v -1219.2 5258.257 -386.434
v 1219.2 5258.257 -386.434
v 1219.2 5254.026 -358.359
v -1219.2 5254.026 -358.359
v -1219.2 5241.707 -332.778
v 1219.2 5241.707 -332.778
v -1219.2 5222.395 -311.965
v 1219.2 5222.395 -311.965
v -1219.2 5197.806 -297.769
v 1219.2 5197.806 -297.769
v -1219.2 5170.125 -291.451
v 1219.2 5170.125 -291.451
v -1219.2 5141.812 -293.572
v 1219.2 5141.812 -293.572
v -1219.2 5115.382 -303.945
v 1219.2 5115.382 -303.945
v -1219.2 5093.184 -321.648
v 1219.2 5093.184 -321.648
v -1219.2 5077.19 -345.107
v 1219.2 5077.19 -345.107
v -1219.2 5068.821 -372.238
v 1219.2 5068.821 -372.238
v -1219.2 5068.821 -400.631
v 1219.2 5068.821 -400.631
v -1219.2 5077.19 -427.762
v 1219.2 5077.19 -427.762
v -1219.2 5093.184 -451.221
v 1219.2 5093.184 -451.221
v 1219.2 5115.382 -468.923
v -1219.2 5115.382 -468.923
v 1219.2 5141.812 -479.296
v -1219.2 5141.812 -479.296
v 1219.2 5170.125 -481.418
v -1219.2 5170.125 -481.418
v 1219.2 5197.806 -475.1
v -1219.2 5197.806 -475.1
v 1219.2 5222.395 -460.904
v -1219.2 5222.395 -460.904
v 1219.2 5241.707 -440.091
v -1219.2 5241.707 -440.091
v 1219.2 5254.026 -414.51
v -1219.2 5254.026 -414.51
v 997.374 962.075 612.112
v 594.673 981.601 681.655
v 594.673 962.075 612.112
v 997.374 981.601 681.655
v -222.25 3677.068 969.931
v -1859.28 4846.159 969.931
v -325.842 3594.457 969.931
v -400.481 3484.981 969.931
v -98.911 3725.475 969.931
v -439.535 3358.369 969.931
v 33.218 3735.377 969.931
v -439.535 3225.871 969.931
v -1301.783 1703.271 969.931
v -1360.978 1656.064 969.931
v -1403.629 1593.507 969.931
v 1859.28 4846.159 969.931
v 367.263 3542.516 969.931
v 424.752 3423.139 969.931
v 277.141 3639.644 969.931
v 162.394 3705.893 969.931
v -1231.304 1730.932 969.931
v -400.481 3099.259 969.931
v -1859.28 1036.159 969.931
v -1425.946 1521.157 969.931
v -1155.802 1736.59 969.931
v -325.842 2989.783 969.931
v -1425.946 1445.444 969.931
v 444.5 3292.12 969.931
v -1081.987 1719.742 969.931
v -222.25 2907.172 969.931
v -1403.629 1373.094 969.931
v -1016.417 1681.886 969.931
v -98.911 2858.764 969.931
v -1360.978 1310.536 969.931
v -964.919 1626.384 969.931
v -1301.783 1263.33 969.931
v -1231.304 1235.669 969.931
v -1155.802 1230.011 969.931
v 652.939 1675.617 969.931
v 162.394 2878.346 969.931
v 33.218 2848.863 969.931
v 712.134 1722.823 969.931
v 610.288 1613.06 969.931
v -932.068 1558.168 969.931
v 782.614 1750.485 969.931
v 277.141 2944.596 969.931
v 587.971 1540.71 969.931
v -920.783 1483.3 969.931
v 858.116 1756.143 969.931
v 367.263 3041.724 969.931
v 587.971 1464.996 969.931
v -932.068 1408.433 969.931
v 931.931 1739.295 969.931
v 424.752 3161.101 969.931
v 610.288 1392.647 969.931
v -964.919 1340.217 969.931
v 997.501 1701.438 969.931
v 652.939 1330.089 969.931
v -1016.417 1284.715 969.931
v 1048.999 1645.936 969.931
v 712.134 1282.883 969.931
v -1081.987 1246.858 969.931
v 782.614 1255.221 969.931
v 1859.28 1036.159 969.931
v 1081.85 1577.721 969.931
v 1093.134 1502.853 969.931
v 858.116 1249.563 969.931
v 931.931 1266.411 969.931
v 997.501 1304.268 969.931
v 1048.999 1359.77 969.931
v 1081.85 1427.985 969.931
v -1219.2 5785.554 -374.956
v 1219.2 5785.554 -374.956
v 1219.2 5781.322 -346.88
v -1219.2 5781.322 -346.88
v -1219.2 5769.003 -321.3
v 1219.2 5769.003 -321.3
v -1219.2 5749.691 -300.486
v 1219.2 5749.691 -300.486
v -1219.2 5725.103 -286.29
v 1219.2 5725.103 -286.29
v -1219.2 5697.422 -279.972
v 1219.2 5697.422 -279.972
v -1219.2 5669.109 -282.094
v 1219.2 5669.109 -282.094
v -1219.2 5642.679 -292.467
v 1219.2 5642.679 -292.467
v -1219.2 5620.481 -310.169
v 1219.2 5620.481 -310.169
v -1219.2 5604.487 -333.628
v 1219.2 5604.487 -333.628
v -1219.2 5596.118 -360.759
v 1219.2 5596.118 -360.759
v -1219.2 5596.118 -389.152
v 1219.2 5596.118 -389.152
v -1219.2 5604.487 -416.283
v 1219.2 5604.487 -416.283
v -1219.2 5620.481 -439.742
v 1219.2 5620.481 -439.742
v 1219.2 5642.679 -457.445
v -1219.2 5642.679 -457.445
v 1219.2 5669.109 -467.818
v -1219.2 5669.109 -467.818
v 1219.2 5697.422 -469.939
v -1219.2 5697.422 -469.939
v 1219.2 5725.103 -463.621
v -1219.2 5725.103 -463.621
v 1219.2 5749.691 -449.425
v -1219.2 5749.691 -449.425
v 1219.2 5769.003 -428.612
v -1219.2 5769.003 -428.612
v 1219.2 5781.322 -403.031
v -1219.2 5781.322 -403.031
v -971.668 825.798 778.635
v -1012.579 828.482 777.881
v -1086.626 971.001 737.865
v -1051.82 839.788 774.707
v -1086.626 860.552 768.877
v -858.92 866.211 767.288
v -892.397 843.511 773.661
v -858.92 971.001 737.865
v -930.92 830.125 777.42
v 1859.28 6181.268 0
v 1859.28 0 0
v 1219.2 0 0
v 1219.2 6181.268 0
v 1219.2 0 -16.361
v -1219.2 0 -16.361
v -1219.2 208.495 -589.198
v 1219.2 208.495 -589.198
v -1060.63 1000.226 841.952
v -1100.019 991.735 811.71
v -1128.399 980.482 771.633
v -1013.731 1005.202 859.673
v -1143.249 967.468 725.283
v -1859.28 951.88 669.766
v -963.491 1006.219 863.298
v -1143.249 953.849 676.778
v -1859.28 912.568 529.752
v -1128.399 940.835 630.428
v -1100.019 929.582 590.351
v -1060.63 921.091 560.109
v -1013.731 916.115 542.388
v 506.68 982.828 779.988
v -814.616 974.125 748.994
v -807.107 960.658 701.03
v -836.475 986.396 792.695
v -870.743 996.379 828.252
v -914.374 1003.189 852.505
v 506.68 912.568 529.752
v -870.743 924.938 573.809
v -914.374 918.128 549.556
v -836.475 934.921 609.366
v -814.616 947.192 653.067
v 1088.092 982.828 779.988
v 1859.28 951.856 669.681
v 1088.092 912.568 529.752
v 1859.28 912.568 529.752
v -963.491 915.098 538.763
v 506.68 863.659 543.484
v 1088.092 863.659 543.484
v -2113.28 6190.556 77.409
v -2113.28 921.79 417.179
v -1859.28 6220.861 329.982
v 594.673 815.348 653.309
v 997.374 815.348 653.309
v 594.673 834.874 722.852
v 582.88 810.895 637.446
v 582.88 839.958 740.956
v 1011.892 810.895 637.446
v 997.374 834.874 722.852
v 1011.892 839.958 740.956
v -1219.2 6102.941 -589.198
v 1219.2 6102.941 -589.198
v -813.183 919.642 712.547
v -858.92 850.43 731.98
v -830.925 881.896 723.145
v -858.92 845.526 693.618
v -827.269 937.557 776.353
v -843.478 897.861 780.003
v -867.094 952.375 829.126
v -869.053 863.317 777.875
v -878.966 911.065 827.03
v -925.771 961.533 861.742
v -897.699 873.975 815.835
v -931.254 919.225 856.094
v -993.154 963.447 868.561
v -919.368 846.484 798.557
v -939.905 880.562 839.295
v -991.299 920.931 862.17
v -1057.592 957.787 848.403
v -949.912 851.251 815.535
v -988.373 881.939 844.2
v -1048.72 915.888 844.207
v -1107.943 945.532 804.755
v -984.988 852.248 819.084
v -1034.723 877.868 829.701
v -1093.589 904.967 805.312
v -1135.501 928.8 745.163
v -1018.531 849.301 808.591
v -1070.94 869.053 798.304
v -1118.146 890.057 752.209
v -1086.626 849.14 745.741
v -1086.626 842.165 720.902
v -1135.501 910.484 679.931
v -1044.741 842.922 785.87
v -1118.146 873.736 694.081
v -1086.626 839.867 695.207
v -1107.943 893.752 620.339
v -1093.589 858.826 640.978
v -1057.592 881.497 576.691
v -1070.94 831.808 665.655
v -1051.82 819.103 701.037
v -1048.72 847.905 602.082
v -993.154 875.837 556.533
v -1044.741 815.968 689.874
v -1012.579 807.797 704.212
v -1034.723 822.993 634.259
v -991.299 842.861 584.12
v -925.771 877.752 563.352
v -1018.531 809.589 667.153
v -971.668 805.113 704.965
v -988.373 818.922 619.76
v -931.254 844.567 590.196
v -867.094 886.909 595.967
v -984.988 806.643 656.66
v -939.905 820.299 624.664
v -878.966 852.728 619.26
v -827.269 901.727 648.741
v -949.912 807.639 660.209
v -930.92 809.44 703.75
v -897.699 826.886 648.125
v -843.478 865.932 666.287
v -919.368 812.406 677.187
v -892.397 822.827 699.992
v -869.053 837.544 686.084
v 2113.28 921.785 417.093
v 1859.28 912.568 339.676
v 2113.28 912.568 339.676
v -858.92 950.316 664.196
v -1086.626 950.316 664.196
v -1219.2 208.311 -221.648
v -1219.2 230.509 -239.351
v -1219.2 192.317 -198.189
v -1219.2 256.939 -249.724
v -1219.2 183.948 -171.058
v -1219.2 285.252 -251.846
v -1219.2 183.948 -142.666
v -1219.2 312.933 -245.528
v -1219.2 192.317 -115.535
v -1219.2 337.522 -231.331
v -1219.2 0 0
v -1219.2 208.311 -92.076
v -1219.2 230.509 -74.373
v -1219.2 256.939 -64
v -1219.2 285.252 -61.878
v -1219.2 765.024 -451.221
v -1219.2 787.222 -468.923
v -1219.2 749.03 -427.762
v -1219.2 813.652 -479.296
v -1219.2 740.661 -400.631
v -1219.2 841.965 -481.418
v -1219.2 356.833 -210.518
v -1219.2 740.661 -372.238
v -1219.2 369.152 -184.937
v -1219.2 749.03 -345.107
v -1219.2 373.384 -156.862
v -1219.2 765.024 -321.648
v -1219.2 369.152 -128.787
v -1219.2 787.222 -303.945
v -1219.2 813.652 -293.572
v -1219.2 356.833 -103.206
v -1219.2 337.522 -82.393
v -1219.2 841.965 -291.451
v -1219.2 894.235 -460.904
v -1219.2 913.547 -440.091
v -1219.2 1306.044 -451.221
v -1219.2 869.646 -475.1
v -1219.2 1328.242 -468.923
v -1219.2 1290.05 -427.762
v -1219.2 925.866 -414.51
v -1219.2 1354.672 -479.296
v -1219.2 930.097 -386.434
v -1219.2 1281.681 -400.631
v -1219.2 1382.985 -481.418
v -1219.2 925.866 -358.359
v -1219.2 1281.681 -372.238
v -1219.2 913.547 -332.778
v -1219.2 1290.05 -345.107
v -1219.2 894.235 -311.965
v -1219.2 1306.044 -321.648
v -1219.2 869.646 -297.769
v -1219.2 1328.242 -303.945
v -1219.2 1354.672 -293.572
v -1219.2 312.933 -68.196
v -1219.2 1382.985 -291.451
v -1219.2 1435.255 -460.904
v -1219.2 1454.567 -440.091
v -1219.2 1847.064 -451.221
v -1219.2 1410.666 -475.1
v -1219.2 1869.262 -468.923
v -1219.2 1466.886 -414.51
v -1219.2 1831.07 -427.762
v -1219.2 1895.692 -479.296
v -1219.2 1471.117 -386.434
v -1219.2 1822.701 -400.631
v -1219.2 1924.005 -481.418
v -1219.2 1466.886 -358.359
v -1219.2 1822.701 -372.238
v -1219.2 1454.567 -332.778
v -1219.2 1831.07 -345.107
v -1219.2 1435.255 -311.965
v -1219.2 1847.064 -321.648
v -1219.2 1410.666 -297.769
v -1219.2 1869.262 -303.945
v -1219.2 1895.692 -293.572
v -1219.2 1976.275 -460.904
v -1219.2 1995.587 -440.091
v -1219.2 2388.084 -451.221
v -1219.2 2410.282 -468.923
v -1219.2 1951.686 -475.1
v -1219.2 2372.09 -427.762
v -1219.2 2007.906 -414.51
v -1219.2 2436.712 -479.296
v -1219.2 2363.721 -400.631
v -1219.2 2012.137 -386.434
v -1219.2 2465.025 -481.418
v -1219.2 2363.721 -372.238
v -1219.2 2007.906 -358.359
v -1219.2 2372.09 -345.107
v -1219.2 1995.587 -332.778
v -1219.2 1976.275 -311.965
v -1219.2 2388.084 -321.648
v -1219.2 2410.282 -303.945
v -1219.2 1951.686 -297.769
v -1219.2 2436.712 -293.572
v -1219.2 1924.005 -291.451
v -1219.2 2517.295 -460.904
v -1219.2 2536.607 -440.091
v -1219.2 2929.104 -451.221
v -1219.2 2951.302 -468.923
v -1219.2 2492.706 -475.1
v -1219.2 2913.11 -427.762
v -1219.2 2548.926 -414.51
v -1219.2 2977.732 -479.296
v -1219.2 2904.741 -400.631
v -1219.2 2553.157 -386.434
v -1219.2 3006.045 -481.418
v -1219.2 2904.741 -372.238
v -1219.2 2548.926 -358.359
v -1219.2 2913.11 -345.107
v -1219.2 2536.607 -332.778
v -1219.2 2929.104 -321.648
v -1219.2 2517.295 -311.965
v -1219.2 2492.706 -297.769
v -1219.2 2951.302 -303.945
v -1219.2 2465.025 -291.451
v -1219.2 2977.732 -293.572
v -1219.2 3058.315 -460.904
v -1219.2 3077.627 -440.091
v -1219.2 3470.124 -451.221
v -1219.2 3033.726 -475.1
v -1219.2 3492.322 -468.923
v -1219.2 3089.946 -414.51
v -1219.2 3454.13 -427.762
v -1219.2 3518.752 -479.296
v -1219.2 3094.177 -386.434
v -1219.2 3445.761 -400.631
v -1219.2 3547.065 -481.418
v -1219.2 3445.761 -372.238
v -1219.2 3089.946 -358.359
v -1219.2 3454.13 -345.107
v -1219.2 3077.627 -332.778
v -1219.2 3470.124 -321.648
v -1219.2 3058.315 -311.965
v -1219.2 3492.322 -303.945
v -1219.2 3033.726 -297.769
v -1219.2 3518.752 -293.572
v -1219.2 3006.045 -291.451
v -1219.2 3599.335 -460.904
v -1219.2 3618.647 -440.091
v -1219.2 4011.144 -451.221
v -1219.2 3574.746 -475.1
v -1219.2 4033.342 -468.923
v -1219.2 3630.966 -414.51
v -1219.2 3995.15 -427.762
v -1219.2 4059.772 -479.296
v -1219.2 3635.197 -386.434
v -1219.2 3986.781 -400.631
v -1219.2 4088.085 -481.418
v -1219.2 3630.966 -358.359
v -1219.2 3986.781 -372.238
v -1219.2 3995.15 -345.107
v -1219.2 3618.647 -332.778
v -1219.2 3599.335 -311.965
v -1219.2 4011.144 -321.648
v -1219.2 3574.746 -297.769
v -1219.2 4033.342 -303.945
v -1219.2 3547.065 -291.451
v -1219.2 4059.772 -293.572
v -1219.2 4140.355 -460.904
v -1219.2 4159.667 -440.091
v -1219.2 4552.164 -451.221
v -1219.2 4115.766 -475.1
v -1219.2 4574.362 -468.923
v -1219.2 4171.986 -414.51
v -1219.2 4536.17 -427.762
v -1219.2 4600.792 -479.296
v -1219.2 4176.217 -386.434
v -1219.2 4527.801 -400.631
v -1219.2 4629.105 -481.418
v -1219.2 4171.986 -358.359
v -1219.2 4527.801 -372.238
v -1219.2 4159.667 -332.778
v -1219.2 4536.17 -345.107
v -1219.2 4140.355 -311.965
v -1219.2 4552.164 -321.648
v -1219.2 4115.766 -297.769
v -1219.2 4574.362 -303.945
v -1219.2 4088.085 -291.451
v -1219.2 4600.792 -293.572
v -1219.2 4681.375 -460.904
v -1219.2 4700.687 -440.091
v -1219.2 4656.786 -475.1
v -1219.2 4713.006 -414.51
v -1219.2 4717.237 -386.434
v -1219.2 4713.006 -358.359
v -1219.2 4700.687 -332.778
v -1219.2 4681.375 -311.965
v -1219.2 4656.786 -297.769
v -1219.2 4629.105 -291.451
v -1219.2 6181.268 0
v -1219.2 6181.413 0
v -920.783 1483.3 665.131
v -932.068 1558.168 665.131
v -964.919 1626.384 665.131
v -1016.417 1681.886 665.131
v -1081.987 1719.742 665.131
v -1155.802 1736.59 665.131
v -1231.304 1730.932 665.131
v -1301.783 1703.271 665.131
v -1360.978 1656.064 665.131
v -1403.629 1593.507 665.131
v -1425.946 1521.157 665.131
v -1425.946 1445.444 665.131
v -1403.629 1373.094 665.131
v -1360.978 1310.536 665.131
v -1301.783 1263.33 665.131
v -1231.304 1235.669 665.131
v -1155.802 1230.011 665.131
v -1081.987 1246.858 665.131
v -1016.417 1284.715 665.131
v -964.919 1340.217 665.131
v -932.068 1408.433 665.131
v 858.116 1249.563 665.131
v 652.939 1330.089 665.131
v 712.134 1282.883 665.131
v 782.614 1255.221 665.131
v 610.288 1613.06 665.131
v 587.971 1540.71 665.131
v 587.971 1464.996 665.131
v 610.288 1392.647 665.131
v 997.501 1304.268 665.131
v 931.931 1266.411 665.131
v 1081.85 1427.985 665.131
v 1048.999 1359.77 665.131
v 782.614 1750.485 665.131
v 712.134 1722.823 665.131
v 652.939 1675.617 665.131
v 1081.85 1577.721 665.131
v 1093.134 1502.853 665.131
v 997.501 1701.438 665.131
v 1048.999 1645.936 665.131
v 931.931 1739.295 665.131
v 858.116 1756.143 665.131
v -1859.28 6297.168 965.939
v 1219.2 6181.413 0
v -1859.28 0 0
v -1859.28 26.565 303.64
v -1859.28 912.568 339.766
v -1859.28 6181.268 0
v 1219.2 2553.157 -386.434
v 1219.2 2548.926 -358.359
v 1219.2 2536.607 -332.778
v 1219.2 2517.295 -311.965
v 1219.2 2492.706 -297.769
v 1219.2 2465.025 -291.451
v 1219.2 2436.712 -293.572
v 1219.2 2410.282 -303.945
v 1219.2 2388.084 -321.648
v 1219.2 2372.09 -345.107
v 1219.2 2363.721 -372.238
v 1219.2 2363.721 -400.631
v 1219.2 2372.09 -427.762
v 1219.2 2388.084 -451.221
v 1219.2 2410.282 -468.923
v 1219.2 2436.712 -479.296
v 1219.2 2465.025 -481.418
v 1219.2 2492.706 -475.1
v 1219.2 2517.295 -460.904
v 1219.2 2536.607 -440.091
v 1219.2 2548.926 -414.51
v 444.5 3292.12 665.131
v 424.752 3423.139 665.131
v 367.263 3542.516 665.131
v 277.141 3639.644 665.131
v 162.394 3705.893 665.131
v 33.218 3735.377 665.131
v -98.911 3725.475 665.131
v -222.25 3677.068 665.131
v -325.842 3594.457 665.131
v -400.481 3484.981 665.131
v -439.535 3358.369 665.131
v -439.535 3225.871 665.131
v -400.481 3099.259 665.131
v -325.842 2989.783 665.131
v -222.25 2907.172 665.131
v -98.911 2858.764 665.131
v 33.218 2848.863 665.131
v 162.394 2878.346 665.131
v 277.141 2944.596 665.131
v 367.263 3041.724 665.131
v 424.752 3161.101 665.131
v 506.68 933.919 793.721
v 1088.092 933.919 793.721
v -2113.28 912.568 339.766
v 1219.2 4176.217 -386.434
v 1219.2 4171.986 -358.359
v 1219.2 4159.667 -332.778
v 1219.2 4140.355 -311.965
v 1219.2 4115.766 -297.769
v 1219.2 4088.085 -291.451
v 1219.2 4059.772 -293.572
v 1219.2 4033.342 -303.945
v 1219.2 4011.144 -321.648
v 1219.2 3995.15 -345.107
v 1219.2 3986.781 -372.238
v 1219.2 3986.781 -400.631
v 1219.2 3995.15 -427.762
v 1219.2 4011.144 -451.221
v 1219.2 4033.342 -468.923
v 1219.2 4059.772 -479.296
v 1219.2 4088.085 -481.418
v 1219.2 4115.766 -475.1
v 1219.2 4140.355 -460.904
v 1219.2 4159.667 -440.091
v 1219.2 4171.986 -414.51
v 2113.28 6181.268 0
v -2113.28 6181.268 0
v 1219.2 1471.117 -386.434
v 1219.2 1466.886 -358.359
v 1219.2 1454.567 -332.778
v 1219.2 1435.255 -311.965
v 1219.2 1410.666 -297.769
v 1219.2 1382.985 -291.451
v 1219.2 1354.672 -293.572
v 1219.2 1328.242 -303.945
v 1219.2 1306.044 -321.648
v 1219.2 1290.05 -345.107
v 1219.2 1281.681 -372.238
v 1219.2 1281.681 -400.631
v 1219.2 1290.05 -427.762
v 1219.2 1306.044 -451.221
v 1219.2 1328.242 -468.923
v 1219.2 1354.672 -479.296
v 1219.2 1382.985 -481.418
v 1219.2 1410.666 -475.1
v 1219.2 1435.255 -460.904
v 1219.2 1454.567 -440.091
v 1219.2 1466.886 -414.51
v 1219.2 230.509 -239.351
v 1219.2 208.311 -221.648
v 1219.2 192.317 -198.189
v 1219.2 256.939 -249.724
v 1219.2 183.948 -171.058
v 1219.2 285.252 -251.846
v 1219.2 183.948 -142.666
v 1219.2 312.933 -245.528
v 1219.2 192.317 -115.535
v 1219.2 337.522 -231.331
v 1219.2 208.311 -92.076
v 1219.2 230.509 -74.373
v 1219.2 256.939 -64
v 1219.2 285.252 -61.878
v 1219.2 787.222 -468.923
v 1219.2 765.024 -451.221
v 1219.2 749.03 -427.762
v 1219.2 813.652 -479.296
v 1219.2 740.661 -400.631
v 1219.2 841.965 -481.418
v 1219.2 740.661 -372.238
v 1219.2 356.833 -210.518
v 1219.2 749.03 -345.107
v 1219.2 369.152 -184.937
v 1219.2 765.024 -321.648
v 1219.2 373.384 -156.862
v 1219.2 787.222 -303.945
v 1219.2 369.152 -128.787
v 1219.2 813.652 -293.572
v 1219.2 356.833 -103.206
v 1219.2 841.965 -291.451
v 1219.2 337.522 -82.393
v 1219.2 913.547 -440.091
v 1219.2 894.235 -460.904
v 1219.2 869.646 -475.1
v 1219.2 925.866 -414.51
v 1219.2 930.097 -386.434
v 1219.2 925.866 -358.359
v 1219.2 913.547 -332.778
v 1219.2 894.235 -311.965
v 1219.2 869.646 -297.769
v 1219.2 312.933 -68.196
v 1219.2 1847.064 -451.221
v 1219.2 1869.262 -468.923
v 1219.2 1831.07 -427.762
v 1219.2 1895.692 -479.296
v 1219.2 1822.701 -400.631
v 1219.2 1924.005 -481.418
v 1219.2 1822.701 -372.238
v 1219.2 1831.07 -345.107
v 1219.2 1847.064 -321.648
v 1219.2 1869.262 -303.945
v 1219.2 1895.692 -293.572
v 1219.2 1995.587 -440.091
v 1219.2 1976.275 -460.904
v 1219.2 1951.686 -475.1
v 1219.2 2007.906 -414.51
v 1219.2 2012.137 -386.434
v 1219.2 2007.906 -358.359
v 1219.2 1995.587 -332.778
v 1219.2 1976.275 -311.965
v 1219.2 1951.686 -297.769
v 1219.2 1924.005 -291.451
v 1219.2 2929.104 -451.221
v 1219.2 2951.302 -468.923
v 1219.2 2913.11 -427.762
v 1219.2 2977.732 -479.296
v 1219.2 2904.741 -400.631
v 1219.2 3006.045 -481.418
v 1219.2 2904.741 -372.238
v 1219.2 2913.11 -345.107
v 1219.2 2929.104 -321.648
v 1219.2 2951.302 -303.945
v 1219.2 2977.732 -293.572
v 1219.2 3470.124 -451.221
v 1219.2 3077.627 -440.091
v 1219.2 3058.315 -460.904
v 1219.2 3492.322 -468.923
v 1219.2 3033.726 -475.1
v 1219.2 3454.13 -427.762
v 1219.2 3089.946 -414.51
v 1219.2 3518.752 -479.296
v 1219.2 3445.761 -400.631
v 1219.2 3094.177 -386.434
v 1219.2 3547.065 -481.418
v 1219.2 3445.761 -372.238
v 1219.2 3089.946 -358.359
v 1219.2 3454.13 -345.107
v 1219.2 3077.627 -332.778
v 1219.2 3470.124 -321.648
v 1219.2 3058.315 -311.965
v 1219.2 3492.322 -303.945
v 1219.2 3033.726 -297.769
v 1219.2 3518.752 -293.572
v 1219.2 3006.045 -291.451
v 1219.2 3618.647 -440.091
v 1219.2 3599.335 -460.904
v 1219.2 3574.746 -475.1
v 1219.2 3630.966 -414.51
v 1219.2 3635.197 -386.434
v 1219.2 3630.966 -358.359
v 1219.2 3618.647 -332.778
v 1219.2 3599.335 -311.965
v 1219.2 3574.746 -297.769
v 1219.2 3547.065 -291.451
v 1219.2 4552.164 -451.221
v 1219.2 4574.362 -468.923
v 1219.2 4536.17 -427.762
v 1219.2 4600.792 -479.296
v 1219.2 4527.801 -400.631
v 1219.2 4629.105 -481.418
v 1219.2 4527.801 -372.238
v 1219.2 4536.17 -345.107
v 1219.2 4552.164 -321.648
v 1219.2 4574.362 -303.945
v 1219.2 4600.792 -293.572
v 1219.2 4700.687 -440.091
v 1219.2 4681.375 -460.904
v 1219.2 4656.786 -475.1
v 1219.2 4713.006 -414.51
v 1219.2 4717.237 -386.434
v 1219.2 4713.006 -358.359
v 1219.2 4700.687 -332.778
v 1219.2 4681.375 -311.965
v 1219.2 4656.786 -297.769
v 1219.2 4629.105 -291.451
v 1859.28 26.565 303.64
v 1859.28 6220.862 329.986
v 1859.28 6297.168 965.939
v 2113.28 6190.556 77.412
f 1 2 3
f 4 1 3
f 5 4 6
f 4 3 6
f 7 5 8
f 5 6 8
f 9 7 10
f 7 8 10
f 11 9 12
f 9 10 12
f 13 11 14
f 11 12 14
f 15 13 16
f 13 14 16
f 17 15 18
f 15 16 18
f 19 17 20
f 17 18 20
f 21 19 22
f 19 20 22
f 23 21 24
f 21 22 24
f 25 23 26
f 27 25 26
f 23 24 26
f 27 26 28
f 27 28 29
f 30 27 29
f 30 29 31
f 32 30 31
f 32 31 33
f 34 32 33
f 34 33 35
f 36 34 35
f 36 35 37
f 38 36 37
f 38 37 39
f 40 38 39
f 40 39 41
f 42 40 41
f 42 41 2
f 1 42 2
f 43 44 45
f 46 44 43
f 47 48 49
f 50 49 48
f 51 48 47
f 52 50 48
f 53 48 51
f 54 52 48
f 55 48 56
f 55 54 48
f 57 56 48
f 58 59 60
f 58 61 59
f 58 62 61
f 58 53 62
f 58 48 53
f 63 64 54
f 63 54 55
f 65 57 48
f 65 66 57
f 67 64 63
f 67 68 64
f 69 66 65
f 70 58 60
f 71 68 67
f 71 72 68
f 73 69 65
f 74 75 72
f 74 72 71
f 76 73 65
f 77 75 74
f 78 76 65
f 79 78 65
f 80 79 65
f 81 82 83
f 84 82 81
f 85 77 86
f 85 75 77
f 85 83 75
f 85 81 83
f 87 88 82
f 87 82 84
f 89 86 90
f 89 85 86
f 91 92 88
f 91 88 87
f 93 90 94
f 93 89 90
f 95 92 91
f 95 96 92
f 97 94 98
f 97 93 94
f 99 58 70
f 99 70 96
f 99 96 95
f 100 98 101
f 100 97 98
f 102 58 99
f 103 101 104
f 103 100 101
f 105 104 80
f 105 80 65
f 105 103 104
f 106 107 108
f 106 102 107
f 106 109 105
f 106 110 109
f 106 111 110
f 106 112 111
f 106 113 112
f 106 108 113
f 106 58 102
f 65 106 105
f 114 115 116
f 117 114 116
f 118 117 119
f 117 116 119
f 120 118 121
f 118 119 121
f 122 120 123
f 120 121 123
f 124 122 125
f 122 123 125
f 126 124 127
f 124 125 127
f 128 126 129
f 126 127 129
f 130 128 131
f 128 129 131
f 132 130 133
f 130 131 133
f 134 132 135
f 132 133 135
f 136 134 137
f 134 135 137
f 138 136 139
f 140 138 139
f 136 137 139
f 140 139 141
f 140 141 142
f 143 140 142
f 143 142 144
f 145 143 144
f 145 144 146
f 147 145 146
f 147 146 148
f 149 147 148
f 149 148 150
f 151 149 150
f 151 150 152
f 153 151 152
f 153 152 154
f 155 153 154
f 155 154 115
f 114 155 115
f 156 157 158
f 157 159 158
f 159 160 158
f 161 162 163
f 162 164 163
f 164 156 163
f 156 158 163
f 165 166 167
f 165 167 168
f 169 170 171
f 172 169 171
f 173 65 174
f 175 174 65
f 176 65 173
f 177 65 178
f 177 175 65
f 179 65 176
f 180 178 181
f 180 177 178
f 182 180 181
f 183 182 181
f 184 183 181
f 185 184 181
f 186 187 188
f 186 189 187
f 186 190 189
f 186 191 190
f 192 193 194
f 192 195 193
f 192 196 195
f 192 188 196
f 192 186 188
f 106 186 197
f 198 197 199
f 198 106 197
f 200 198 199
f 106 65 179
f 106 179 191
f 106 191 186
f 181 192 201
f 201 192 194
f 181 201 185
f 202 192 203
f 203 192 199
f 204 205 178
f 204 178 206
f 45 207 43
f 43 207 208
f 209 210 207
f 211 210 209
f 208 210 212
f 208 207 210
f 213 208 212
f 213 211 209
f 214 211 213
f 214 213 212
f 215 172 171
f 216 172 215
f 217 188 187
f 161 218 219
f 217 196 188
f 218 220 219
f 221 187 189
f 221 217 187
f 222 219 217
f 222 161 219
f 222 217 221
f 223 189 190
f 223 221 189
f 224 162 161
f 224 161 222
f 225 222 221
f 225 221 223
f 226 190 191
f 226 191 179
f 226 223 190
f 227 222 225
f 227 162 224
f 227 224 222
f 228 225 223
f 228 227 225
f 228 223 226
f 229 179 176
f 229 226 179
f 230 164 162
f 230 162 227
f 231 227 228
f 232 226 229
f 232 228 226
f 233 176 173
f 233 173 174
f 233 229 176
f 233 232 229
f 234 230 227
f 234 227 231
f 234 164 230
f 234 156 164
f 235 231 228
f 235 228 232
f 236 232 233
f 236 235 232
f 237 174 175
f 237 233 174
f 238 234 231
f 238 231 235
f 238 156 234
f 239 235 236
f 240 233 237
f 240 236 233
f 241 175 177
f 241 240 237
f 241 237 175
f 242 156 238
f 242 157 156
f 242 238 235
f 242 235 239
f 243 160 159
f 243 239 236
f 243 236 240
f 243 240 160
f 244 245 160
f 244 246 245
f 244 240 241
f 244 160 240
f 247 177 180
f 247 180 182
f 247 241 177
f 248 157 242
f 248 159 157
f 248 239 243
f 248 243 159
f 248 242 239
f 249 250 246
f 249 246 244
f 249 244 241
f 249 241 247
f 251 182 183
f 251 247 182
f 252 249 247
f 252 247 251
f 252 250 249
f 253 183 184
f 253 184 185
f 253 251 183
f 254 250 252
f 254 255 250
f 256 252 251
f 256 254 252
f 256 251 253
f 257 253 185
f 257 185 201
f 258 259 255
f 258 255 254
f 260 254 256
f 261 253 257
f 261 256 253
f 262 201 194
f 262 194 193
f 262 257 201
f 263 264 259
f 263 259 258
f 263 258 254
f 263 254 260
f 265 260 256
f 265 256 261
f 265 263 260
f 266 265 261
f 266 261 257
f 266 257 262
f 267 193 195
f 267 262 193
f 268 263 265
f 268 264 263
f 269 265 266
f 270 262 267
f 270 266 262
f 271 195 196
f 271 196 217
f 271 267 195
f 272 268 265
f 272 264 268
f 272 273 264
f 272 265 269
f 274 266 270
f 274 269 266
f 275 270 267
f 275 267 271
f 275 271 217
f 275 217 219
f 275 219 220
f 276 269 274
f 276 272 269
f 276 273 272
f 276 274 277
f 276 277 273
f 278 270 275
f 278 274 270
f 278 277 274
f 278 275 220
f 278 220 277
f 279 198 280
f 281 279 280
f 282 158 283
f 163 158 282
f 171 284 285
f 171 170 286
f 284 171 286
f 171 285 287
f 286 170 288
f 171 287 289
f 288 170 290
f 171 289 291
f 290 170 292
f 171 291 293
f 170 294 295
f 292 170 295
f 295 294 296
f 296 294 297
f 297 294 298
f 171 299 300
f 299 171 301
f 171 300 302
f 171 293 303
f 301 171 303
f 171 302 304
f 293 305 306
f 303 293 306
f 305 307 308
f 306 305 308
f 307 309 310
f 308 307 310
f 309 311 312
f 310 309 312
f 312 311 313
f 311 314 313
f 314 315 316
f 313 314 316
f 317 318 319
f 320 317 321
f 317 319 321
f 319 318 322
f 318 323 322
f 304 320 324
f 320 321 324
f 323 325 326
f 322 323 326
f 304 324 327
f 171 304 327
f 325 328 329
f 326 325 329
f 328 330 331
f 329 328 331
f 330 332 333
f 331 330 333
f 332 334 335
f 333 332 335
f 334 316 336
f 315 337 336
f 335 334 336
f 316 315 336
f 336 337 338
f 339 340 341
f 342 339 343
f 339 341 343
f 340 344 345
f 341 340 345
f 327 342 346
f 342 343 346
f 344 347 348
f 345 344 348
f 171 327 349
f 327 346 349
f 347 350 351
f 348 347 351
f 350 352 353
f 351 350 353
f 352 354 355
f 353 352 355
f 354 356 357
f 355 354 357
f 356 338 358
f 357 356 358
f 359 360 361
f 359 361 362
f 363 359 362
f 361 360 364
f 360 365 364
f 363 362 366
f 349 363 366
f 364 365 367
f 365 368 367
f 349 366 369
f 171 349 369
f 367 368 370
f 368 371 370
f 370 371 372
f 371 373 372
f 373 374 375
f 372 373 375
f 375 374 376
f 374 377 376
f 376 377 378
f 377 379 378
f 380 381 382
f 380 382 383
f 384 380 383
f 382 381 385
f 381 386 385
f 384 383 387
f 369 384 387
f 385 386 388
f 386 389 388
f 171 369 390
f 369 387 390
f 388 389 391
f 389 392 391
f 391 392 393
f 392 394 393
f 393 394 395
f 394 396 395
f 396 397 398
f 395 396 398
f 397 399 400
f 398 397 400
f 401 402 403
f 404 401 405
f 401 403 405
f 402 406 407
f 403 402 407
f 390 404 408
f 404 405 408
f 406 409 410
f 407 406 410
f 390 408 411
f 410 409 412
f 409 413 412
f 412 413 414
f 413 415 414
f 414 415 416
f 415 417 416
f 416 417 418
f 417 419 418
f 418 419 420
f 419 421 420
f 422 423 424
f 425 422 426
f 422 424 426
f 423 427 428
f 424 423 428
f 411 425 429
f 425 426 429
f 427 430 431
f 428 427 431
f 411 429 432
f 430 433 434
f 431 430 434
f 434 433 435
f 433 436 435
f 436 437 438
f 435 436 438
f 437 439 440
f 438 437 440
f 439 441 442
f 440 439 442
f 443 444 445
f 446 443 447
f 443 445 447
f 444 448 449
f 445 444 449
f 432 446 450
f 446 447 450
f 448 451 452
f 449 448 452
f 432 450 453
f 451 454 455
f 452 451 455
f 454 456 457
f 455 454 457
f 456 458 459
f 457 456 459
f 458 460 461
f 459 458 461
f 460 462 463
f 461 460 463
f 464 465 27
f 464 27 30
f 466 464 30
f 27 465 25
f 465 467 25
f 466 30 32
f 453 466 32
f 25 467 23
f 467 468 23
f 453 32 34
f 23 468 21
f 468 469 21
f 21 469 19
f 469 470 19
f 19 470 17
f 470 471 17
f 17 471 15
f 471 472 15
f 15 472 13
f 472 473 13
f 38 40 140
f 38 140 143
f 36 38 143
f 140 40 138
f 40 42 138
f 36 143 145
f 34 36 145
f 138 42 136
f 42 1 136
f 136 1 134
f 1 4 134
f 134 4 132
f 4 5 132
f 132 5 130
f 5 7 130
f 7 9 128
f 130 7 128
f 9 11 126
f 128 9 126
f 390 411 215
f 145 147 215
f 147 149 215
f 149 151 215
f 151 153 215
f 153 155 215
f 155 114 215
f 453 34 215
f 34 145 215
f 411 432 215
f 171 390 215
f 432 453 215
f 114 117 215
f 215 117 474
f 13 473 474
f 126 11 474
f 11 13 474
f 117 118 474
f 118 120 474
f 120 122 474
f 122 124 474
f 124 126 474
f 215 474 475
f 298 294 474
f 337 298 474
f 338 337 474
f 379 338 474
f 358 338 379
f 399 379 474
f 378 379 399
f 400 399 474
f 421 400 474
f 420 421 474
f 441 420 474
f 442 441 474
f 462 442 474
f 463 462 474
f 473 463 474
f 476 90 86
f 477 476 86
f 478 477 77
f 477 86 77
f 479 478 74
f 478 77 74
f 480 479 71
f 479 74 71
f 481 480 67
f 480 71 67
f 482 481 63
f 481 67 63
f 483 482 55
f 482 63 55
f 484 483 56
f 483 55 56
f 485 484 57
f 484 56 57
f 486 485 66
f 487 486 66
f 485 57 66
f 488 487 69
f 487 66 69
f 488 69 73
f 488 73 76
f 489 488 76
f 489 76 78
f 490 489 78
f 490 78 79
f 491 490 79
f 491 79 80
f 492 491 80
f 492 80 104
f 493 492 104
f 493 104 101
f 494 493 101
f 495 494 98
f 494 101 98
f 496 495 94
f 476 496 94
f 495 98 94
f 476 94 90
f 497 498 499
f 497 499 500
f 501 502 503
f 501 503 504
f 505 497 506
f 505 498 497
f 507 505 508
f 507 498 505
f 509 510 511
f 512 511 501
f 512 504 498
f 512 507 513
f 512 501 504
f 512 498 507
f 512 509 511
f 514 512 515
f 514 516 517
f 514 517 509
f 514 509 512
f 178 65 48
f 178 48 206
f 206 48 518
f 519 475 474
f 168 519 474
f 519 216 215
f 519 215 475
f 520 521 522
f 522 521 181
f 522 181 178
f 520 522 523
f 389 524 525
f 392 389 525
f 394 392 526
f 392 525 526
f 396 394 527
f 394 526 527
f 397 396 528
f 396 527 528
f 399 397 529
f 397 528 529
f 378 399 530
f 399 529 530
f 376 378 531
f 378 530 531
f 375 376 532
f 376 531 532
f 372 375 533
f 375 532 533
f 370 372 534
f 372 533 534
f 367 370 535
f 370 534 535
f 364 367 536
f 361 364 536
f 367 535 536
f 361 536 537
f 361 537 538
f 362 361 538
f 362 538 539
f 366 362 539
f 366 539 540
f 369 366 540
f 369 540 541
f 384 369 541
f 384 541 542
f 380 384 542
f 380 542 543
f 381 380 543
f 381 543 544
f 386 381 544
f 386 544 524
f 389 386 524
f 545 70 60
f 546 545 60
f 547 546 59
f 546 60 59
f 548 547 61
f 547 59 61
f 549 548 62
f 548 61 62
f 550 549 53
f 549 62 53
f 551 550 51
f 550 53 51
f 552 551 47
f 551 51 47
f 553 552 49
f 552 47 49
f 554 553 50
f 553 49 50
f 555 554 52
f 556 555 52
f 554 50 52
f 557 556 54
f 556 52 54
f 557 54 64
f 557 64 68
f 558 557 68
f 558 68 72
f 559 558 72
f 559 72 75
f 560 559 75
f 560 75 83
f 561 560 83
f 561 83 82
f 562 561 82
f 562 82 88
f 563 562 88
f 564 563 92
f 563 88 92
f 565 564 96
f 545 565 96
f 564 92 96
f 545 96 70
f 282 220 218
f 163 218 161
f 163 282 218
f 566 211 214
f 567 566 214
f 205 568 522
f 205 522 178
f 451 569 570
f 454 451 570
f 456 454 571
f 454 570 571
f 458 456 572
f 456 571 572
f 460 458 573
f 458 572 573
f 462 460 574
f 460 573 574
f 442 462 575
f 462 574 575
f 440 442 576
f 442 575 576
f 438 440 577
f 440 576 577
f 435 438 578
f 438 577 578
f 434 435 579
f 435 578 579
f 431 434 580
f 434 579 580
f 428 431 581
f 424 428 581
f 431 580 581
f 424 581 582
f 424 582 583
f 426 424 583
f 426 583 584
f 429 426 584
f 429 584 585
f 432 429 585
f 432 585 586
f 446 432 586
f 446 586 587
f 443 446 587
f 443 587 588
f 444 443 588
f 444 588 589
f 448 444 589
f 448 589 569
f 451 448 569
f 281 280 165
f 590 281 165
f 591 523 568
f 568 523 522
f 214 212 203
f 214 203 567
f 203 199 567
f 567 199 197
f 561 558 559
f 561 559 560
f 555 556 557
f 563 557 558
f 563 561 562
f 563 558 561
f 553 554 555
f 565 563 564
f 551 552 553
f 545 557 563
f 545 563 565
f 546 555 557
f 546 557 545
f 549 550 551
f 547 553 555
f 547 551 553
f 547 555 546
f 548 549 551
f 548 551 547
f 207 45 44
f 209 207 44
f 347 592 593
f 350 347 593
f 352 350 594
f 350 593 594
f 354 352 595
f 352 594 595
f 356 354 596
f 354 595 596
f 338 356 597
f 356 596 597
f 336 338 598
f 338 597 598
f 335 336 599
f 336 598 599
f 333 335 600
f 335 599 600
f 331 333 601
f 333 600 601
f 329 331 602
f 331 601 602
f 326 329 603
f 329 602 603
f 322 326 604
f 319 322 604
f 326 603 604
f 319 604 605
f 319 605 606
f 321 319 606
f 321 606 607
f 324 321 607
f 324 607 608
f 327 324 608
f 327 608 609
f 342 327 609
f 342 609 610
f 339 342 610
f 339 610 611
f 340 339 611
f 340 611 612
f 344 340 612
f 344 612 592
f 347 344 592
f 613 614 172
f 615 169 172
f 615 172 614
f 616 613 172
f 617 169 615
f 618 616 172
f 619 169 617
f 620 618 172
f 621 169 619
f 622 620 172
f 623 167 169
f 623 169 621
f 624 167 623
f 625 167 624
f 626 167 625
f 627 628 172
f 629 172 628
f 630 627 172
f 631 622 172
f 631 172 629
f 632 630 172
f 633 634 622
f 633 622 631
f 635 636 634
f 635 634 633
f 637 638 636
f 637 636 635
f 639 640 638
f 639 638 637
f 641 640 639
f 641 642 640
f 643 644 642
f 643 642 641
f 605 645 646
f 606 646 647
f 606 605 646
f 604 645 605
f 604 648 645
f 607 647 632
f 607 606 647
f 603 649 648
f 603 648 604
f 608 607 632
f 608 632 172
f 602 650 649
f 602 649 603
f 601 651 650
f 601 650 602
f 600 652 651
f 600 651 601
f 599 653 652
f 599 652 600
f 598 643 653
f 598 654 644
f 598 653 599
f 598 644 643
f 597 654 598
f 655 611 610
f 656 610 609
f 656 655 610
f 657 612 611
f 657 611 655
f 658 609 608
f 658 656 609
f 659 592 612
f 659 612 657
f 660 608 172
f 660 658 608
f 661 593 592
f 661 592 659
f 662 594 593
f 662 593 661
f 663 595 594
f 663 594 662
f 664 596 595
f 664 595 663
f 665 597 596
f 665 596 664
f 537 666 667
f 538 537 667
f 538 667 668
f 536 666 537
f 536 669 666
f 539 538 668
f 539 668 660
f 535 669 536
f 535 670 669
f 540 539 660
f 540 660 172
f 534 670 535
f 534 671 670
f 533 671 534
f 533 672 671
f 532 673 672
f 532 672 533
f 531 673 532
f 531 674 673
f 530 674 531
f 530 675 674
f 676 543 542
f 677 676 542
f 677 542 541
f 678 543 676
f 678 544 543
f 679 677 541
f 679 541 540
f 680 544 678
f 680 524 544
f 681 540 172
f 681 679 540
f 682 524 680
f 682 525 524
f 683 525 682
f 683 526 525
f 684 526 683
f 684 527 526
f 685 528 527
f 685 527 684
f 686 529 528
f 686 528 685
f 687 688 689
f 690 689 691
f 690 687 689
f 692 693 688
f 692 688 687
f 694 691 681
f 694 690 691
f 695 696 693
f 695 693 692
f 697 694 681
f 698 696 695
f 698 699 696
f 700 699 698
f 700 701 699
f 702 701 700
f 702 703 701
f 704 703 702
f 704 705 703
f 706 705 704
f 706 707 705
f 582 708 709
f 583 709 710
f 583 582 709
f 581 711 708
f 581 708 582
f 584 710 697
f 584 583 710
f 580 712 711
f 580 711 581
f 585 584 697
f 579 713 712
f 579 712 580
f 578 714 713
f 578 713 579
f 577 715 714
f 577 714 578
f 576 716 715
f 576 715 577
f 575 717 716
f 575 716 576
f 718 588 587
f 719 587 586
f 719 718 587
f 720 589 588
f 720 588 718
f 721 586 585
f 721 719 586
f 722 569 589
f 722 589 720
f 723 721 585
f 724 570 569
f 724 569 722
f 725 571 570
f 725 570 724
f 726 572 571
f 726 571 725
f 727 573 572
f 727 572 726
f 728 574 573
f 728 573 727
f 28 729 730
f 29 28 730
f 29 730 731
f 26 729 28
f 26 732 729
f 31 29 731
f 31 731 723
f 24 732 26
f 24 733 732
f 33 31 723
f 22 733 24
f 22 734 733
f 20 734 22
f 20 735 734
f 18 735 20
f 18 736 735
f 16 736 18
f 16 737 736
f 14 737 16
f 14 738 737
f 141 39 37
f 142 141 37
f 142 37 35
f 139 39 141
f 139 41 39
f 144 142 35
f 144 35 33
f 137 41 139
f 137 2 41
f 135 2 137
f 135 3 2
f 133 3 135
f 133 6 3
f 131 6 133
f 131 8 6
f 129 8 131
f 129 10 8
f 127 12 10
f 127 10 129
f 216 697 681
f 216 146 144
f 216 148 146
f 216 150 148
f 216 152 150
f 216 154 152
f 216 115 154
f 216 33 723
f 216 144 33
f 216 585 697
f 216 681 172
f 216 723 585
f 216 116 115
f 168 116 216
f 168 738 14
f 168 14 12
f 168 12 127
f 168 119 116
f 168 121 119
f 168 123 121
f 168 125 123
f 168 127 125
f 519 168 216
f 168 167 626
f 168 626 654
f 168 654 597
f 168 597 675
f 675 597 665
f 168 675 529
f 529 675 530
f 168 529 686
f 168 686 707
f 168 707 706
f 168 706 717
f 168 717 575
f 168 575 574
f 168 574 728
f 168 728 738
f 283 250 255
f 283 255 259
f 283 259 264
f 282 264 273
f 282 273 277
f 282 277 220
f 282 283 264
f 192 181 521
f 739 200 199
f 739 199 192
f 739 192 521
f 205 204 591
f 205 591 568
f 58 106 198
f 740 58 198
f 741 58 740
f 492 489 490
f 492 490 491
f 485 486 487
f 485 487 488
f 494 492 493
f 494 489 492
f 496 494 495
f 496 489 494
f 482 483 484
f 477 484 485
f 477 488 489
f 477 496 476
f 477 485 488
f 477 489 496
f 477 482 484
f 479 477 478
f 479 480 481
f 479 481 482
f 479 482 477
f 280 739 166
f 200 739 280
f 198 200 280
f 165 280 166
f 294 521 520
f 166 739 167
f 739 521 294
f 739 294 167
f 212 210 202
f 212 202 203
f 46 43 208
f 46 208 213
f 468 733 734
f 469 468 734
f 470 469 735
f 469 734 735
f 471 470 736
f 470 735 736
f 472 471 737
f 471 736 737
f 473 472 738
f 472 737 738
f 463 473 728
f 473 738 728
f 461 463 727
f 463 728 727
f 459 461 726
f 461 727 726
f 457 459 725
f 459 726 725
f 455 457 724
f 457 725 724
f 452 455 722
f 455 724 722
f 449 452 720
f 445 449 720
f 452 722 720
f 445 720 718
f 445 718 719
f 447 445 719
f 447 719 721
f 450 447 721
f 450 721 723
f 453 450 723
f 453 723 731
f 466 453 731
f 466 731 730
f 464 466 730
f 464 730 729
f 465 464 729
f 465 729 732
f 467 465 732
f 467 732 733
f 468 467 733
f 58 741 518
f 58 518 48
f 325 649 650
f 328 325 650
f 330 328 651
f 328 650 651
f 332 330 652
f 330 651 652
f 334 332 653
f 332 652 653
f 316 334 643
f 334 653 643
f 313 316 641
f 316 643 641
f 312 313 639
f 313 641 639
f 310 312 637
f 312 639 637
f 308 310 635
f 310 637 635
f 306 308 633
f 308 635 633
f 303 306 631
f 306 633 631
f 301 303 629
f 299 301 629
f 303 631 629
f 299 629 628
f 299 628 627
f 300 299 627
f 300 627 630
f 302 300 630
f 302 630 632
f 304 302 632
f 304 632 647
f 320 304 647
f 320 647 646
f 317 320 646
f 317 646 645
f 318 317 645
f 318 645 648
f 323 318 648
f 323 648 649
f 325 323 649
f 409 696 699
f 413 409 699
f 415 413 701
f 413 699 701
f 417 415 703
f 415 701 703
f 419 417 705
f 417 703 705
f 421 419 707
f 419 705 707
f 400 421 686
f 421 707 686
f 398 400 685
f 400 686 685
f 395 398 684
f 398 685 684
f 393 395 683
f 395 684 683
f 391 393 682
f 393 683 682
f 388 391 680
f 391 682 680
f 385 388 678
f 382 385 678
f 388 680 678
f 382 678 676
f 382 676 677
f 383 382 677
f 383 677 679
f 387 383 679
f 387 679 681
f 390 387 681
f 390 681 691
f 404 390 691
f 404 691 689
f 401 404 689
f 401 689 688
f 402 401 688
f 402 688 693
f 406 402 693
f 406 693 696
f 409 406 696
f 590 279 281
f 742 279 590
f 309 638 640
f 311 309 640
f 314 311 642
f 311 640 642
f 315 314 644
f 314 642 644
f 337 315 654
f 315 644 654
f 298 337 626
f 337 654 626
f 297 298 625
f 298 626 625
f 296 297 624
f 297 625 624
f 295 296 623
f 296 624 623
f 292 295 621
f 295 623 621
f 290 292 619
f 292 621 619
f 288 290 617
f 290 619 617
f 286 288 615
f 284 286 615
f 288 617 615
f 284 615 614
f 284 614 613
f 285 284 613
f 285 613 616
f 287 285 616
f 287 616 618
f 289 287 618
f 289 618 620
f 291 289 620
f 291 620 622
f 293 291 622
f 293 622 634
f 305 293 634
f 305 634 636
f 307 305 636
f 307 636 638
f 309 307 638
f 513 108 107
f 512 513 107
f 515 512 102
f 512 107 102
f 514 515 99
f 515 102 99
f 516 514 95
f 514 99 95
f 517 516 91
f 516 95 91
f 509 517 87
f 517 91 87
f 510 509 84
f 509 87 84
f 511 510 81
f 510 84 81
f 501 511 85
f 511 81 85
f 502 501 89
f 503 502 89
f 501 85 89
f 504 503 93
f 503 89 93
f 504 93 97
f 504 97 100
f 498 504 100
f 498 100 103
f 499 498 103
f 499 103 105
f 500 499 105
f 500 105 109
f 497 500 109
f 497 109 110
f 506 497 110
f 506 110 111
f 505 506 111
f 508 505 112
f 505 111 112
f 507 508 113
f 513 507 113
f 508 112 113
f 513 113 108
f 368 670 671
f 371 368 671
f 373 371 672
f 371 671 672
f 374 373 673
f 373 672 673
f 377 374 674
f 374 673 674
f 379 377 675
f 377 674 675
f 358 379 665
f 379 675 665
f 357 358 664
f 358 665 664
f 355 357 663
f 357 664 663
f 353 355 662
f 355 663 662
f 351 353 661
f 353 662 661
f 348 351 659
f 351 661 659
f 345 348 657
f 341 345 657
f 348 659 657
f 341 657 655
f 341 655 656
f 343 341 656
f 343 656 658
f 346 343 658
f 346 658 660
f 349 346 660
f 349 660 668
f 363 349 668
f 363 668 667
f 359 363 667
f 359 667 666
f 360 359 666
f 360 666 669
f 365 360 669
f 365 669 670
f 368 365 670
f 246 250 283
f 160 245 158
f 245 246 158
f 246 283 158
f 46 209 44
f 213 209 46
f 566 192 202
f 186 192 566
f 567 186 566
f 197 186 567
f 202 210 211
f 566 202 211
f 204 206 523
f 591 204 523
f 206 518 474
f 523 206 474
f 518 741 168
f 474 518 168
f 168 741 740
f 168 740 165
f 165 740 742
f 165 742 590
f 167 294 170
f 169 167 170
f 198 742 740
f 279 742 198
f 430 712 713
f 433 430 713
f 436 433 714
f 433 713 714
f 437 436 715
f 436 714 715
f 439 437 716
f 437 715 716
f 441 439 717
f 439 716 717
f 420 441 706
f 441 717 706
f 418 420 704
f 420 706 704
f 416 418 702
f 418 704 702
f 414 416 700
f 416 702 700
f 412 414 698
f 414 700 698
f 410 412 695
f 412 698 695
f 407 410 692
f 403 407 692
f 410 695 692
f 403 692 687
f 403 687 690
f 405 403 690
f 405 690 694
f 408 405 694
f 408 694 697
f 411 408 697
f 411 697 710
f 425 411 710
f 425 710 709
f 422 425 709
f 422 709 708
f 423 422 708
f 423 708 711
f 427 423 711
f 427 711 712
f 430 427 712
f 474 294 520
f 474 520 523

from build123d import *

# Parameters (mm, degrees)
F1_DEPTH      = 1859.28
F1_DEPTH_BACK = 1859.28
F3_DEPTH      = 1219.2
F3_DEPTH_BACK = 1219.2
F4_R          = 169.0151007429
F5_DEPTH      = 152.4
F6_R          = 152.39999
F7_W          = 227.70601511
F7_H          = 76.5184164047
F8_DEPTH      = 609.6
F9_W          = 581.4113616943
F9_H          = 259.9127333882
F10_DEPTH     = 127
F11_SIZE      = 76.2
F12_W         = 402.7016162872
F12_H         = 72.2321271896
F13_DEPTH     = 152.4
F14_R         = 254
F15_DEPTH     = 304.8
F16_R         = 444.5
F17_DEPTH     = 304.8
F19_DEPTH     = 254
F20_SIZE      = 253.99999
F22_DEPTH     = 254
F23_SIZE      = 253.99999
F24_R         = 95.25
F25_DEPTH     = 3048


# Not quite as in the source:
# - a fillet or chamfer is up to 0.001 mm smaller than in the source, because OpenCascade refuses the exact size


with BuildPart() as f1:
    # F0 (on Right) → F1 (new body, two sides)
    with BuildSketch(Plane.YZ) as f1_sk:
        Polygon((26.5650703895, 303.6401439784), (0, 0), (6181.2677383423, 0), (6297.168, 965.9386277199), (4846.1590473673, 969.9305323602), (1036.1590473673, 969.9305323602), (912.5677404125, 529.7521266595), align=None)
    extrude(amount=F1_DEPTH)
    extrude(f1_sk.sketch, amount=-F1_DEPTH_BACK)

    # F2 (on Right) → F3 (join, two sides)
    with BuildSketch(Plane.YZ) as f3_sk:
        Polygon((0, 0), (0, -16.3612399525), (208.4954793713, -589.1978615836), (6102.9406406674, -589.1978615836), (6181.4131736755, 0), align=None)
    extrude(amount=F3_DEPTH)
    extrude(f3_sk.sketch, amount=-F3_DEPTH_BACK)

    # F4 (on face) → F5 (join)
    with BuildSketch(Plane(origin=(0, 708.0104155563, -198.7919703987), x_dir=(1, 0, 0), z_dir=(0, -0.9627699162, 0.2703221937))):
        with Locations((-976.1219620705, 934.6183538437)):
            Circle(F4_R)
    extrude(amount=F5_DEPTH)

    # F6 (radius 152.4 in the source; OpenCascade refuses exactly that, so slightly less here)
    f6_edges = [f1.edges().sort_by_distance(p)[0] for p in [
        (-1145.137063, 813.932364, 742.227566),
    ]]
    fillet(f6_edges, radius=F6_R)

    # F7 (on face) → F8 (cut)
    with BuildSketch(Plane(origin=(0, 708.0104155563, -198.7919703987), x_dir=(1, 0, 0), z_dir=(0, -0.9627699162, 0.2703221937))):
        with Locations((-972.7734029293, 934.6184134483)):
            Rectangle(F7_W, F7_H)
    extrude(amount=F8_DEPTH, mode=Mode.SUBTRACT)

    # F9 (on face) → F10 (join)
    with BuildSketch(Plane(origin=(0, 708.0104155563, -198.7919703987), x_dir=(1, 0, 0), z_dir=(0, -0.9627699162, 0.2703221937))):
        with Locations((797.3860502243, 886.6730907796)):
            Rectangle(F9_W, F9_H)
    extrude(amount=F10_DEPTH)

    # F11
    f11_edges = [f1.edges().sort_by_distance(p)[0] for p in [
        (797.38605, 860.556141, 814.319206),
        (1088.091731, 825.426051, 689.201126),
        (797.38605, 790.295961, 564.083045),
        (506.680369, 825.426051, 689.201126),
    ]]
    chamfer(f11_edges, length=F11_SIZE)

    # F12 (on face) → F13 (cut)
    with BuildSketch(Plane(origin=(0, 585.738636195, -164.4610518002), x_dir=(1, 0, 0), z_dir=(0, -0.9627699162, 0.2703221937))):
        with Locations((796.0233688354, 885.5090737343)):
            Rectangle(F12_W, F12_H)
    extrude(amount=-F13_DEPTH, mode=Mode.SUBTRACT)

    # F14 (on face) → F15 (cut)
    with BuildSketch(Plane.XY.offset(969.9305323602)):
        with Locations((-1174.7832298279, 1483.3003282547)):
            Circle(F14_R)
        with Locations((839.1343951225, 1502.8530359268)):
            Circle(F14_R)
    extrude(amount=-F15_DEPTH, mode=Mode.SUBTRACT)

    # F16 (on face) → F17 (cut)
    with BuildSketch(Plane.XY.offset(969.9305323602)):
        with Locations((0, 3292.1198442413)):
            Circle(F16_R)
    extrude(amount=-F17_DEPTH, mode=Mode.SUBTRACT)

    # F18 (on face) → F19 (join)
    with BuildSketch(Plane.YZ.offset(1859.28)):
        Polygon((6220.8618148868, 329.9858638469), (951.8563702908, 669.6811142889), (912.5677404126, 339.6755581523), (6181.2677383423, 0), align=None)
    extrude(amount=F19_DEPTH)

    # F20 (size 254 in the source; OpenCascade refuses exactly that, so slightly less here)
    f20_edges = [f1.edges().sort_by_distance(p)[0] for p in [
        (2113.28, 3586.359093, 499.833489),
    ]]
    chamfer(f20_edges, length=F20_SIZE)

    # F21 (on face) → F22 (join)
    with BuildSketch(Plane(origin=(-1859.28, 0, 0), x_dir=(0, -1, 0), z_dir=(-1, 0, 0))):
        Polygon((-6220.8613622852, 329.9820917646), (-6181.2677383423, 0), (-912.5677404125, 339.7662410411), (-951.8803321296, 669.7664559221), align=None)
    extrude(amount=F22_DEPTH)

    # F23 (size 254 in the source; OpenCascade refuses exactly that, so slightly less here)
    f23_edges = [f1.edges().sort_by_distance(p)[0] for p in [
        (-2113.28, 3586.370847, 499.874274),
    ]]
    chamfer(f23_edges, length=F23_SIZE)

    # F24 (on face) → F25 (cut)
    with BuildSketch(Plane.YZ.offset(1219.2)):
        with Locations((278.1341671944, -156.8619608879)):
            Circle(F24_R)
        with Locations((834.8472714424, -386.4343762398)):
            Circle(F24_R)
        with Locations((1375.8672714424, -386.4343762398)):
            Circle(F24_R)
        with Locations((1916.8872714424, -386.4343762398)):
            Circle(F24_R)
        with Locations((2457.9072714424, -386.4343762398)):
            Circle(F24_R)
        with Locations((2998.9272714424, -386.4343762398)):
            Circle(F24_R)
        with Locations((3539.9472714424, -386.4343762398)):
            Circle(F24_R)
        with Locations((4080.9672714424, -386.4343762398)):
            Circle(F24_R)
        with Locations((4621.9872714424, -386.4343762398)):
            Circle(F24_R)
        with Locations((5163.0072714424, -386.4343762398)):
            Circle(F24_R)
        with Locations((5690.3038024902, -374.9557435513)):
            Circle(F24_R)
    extrude(amount=-F25_DEPTH, mode=Mode.SUBTRACT)


solid = f1.part
